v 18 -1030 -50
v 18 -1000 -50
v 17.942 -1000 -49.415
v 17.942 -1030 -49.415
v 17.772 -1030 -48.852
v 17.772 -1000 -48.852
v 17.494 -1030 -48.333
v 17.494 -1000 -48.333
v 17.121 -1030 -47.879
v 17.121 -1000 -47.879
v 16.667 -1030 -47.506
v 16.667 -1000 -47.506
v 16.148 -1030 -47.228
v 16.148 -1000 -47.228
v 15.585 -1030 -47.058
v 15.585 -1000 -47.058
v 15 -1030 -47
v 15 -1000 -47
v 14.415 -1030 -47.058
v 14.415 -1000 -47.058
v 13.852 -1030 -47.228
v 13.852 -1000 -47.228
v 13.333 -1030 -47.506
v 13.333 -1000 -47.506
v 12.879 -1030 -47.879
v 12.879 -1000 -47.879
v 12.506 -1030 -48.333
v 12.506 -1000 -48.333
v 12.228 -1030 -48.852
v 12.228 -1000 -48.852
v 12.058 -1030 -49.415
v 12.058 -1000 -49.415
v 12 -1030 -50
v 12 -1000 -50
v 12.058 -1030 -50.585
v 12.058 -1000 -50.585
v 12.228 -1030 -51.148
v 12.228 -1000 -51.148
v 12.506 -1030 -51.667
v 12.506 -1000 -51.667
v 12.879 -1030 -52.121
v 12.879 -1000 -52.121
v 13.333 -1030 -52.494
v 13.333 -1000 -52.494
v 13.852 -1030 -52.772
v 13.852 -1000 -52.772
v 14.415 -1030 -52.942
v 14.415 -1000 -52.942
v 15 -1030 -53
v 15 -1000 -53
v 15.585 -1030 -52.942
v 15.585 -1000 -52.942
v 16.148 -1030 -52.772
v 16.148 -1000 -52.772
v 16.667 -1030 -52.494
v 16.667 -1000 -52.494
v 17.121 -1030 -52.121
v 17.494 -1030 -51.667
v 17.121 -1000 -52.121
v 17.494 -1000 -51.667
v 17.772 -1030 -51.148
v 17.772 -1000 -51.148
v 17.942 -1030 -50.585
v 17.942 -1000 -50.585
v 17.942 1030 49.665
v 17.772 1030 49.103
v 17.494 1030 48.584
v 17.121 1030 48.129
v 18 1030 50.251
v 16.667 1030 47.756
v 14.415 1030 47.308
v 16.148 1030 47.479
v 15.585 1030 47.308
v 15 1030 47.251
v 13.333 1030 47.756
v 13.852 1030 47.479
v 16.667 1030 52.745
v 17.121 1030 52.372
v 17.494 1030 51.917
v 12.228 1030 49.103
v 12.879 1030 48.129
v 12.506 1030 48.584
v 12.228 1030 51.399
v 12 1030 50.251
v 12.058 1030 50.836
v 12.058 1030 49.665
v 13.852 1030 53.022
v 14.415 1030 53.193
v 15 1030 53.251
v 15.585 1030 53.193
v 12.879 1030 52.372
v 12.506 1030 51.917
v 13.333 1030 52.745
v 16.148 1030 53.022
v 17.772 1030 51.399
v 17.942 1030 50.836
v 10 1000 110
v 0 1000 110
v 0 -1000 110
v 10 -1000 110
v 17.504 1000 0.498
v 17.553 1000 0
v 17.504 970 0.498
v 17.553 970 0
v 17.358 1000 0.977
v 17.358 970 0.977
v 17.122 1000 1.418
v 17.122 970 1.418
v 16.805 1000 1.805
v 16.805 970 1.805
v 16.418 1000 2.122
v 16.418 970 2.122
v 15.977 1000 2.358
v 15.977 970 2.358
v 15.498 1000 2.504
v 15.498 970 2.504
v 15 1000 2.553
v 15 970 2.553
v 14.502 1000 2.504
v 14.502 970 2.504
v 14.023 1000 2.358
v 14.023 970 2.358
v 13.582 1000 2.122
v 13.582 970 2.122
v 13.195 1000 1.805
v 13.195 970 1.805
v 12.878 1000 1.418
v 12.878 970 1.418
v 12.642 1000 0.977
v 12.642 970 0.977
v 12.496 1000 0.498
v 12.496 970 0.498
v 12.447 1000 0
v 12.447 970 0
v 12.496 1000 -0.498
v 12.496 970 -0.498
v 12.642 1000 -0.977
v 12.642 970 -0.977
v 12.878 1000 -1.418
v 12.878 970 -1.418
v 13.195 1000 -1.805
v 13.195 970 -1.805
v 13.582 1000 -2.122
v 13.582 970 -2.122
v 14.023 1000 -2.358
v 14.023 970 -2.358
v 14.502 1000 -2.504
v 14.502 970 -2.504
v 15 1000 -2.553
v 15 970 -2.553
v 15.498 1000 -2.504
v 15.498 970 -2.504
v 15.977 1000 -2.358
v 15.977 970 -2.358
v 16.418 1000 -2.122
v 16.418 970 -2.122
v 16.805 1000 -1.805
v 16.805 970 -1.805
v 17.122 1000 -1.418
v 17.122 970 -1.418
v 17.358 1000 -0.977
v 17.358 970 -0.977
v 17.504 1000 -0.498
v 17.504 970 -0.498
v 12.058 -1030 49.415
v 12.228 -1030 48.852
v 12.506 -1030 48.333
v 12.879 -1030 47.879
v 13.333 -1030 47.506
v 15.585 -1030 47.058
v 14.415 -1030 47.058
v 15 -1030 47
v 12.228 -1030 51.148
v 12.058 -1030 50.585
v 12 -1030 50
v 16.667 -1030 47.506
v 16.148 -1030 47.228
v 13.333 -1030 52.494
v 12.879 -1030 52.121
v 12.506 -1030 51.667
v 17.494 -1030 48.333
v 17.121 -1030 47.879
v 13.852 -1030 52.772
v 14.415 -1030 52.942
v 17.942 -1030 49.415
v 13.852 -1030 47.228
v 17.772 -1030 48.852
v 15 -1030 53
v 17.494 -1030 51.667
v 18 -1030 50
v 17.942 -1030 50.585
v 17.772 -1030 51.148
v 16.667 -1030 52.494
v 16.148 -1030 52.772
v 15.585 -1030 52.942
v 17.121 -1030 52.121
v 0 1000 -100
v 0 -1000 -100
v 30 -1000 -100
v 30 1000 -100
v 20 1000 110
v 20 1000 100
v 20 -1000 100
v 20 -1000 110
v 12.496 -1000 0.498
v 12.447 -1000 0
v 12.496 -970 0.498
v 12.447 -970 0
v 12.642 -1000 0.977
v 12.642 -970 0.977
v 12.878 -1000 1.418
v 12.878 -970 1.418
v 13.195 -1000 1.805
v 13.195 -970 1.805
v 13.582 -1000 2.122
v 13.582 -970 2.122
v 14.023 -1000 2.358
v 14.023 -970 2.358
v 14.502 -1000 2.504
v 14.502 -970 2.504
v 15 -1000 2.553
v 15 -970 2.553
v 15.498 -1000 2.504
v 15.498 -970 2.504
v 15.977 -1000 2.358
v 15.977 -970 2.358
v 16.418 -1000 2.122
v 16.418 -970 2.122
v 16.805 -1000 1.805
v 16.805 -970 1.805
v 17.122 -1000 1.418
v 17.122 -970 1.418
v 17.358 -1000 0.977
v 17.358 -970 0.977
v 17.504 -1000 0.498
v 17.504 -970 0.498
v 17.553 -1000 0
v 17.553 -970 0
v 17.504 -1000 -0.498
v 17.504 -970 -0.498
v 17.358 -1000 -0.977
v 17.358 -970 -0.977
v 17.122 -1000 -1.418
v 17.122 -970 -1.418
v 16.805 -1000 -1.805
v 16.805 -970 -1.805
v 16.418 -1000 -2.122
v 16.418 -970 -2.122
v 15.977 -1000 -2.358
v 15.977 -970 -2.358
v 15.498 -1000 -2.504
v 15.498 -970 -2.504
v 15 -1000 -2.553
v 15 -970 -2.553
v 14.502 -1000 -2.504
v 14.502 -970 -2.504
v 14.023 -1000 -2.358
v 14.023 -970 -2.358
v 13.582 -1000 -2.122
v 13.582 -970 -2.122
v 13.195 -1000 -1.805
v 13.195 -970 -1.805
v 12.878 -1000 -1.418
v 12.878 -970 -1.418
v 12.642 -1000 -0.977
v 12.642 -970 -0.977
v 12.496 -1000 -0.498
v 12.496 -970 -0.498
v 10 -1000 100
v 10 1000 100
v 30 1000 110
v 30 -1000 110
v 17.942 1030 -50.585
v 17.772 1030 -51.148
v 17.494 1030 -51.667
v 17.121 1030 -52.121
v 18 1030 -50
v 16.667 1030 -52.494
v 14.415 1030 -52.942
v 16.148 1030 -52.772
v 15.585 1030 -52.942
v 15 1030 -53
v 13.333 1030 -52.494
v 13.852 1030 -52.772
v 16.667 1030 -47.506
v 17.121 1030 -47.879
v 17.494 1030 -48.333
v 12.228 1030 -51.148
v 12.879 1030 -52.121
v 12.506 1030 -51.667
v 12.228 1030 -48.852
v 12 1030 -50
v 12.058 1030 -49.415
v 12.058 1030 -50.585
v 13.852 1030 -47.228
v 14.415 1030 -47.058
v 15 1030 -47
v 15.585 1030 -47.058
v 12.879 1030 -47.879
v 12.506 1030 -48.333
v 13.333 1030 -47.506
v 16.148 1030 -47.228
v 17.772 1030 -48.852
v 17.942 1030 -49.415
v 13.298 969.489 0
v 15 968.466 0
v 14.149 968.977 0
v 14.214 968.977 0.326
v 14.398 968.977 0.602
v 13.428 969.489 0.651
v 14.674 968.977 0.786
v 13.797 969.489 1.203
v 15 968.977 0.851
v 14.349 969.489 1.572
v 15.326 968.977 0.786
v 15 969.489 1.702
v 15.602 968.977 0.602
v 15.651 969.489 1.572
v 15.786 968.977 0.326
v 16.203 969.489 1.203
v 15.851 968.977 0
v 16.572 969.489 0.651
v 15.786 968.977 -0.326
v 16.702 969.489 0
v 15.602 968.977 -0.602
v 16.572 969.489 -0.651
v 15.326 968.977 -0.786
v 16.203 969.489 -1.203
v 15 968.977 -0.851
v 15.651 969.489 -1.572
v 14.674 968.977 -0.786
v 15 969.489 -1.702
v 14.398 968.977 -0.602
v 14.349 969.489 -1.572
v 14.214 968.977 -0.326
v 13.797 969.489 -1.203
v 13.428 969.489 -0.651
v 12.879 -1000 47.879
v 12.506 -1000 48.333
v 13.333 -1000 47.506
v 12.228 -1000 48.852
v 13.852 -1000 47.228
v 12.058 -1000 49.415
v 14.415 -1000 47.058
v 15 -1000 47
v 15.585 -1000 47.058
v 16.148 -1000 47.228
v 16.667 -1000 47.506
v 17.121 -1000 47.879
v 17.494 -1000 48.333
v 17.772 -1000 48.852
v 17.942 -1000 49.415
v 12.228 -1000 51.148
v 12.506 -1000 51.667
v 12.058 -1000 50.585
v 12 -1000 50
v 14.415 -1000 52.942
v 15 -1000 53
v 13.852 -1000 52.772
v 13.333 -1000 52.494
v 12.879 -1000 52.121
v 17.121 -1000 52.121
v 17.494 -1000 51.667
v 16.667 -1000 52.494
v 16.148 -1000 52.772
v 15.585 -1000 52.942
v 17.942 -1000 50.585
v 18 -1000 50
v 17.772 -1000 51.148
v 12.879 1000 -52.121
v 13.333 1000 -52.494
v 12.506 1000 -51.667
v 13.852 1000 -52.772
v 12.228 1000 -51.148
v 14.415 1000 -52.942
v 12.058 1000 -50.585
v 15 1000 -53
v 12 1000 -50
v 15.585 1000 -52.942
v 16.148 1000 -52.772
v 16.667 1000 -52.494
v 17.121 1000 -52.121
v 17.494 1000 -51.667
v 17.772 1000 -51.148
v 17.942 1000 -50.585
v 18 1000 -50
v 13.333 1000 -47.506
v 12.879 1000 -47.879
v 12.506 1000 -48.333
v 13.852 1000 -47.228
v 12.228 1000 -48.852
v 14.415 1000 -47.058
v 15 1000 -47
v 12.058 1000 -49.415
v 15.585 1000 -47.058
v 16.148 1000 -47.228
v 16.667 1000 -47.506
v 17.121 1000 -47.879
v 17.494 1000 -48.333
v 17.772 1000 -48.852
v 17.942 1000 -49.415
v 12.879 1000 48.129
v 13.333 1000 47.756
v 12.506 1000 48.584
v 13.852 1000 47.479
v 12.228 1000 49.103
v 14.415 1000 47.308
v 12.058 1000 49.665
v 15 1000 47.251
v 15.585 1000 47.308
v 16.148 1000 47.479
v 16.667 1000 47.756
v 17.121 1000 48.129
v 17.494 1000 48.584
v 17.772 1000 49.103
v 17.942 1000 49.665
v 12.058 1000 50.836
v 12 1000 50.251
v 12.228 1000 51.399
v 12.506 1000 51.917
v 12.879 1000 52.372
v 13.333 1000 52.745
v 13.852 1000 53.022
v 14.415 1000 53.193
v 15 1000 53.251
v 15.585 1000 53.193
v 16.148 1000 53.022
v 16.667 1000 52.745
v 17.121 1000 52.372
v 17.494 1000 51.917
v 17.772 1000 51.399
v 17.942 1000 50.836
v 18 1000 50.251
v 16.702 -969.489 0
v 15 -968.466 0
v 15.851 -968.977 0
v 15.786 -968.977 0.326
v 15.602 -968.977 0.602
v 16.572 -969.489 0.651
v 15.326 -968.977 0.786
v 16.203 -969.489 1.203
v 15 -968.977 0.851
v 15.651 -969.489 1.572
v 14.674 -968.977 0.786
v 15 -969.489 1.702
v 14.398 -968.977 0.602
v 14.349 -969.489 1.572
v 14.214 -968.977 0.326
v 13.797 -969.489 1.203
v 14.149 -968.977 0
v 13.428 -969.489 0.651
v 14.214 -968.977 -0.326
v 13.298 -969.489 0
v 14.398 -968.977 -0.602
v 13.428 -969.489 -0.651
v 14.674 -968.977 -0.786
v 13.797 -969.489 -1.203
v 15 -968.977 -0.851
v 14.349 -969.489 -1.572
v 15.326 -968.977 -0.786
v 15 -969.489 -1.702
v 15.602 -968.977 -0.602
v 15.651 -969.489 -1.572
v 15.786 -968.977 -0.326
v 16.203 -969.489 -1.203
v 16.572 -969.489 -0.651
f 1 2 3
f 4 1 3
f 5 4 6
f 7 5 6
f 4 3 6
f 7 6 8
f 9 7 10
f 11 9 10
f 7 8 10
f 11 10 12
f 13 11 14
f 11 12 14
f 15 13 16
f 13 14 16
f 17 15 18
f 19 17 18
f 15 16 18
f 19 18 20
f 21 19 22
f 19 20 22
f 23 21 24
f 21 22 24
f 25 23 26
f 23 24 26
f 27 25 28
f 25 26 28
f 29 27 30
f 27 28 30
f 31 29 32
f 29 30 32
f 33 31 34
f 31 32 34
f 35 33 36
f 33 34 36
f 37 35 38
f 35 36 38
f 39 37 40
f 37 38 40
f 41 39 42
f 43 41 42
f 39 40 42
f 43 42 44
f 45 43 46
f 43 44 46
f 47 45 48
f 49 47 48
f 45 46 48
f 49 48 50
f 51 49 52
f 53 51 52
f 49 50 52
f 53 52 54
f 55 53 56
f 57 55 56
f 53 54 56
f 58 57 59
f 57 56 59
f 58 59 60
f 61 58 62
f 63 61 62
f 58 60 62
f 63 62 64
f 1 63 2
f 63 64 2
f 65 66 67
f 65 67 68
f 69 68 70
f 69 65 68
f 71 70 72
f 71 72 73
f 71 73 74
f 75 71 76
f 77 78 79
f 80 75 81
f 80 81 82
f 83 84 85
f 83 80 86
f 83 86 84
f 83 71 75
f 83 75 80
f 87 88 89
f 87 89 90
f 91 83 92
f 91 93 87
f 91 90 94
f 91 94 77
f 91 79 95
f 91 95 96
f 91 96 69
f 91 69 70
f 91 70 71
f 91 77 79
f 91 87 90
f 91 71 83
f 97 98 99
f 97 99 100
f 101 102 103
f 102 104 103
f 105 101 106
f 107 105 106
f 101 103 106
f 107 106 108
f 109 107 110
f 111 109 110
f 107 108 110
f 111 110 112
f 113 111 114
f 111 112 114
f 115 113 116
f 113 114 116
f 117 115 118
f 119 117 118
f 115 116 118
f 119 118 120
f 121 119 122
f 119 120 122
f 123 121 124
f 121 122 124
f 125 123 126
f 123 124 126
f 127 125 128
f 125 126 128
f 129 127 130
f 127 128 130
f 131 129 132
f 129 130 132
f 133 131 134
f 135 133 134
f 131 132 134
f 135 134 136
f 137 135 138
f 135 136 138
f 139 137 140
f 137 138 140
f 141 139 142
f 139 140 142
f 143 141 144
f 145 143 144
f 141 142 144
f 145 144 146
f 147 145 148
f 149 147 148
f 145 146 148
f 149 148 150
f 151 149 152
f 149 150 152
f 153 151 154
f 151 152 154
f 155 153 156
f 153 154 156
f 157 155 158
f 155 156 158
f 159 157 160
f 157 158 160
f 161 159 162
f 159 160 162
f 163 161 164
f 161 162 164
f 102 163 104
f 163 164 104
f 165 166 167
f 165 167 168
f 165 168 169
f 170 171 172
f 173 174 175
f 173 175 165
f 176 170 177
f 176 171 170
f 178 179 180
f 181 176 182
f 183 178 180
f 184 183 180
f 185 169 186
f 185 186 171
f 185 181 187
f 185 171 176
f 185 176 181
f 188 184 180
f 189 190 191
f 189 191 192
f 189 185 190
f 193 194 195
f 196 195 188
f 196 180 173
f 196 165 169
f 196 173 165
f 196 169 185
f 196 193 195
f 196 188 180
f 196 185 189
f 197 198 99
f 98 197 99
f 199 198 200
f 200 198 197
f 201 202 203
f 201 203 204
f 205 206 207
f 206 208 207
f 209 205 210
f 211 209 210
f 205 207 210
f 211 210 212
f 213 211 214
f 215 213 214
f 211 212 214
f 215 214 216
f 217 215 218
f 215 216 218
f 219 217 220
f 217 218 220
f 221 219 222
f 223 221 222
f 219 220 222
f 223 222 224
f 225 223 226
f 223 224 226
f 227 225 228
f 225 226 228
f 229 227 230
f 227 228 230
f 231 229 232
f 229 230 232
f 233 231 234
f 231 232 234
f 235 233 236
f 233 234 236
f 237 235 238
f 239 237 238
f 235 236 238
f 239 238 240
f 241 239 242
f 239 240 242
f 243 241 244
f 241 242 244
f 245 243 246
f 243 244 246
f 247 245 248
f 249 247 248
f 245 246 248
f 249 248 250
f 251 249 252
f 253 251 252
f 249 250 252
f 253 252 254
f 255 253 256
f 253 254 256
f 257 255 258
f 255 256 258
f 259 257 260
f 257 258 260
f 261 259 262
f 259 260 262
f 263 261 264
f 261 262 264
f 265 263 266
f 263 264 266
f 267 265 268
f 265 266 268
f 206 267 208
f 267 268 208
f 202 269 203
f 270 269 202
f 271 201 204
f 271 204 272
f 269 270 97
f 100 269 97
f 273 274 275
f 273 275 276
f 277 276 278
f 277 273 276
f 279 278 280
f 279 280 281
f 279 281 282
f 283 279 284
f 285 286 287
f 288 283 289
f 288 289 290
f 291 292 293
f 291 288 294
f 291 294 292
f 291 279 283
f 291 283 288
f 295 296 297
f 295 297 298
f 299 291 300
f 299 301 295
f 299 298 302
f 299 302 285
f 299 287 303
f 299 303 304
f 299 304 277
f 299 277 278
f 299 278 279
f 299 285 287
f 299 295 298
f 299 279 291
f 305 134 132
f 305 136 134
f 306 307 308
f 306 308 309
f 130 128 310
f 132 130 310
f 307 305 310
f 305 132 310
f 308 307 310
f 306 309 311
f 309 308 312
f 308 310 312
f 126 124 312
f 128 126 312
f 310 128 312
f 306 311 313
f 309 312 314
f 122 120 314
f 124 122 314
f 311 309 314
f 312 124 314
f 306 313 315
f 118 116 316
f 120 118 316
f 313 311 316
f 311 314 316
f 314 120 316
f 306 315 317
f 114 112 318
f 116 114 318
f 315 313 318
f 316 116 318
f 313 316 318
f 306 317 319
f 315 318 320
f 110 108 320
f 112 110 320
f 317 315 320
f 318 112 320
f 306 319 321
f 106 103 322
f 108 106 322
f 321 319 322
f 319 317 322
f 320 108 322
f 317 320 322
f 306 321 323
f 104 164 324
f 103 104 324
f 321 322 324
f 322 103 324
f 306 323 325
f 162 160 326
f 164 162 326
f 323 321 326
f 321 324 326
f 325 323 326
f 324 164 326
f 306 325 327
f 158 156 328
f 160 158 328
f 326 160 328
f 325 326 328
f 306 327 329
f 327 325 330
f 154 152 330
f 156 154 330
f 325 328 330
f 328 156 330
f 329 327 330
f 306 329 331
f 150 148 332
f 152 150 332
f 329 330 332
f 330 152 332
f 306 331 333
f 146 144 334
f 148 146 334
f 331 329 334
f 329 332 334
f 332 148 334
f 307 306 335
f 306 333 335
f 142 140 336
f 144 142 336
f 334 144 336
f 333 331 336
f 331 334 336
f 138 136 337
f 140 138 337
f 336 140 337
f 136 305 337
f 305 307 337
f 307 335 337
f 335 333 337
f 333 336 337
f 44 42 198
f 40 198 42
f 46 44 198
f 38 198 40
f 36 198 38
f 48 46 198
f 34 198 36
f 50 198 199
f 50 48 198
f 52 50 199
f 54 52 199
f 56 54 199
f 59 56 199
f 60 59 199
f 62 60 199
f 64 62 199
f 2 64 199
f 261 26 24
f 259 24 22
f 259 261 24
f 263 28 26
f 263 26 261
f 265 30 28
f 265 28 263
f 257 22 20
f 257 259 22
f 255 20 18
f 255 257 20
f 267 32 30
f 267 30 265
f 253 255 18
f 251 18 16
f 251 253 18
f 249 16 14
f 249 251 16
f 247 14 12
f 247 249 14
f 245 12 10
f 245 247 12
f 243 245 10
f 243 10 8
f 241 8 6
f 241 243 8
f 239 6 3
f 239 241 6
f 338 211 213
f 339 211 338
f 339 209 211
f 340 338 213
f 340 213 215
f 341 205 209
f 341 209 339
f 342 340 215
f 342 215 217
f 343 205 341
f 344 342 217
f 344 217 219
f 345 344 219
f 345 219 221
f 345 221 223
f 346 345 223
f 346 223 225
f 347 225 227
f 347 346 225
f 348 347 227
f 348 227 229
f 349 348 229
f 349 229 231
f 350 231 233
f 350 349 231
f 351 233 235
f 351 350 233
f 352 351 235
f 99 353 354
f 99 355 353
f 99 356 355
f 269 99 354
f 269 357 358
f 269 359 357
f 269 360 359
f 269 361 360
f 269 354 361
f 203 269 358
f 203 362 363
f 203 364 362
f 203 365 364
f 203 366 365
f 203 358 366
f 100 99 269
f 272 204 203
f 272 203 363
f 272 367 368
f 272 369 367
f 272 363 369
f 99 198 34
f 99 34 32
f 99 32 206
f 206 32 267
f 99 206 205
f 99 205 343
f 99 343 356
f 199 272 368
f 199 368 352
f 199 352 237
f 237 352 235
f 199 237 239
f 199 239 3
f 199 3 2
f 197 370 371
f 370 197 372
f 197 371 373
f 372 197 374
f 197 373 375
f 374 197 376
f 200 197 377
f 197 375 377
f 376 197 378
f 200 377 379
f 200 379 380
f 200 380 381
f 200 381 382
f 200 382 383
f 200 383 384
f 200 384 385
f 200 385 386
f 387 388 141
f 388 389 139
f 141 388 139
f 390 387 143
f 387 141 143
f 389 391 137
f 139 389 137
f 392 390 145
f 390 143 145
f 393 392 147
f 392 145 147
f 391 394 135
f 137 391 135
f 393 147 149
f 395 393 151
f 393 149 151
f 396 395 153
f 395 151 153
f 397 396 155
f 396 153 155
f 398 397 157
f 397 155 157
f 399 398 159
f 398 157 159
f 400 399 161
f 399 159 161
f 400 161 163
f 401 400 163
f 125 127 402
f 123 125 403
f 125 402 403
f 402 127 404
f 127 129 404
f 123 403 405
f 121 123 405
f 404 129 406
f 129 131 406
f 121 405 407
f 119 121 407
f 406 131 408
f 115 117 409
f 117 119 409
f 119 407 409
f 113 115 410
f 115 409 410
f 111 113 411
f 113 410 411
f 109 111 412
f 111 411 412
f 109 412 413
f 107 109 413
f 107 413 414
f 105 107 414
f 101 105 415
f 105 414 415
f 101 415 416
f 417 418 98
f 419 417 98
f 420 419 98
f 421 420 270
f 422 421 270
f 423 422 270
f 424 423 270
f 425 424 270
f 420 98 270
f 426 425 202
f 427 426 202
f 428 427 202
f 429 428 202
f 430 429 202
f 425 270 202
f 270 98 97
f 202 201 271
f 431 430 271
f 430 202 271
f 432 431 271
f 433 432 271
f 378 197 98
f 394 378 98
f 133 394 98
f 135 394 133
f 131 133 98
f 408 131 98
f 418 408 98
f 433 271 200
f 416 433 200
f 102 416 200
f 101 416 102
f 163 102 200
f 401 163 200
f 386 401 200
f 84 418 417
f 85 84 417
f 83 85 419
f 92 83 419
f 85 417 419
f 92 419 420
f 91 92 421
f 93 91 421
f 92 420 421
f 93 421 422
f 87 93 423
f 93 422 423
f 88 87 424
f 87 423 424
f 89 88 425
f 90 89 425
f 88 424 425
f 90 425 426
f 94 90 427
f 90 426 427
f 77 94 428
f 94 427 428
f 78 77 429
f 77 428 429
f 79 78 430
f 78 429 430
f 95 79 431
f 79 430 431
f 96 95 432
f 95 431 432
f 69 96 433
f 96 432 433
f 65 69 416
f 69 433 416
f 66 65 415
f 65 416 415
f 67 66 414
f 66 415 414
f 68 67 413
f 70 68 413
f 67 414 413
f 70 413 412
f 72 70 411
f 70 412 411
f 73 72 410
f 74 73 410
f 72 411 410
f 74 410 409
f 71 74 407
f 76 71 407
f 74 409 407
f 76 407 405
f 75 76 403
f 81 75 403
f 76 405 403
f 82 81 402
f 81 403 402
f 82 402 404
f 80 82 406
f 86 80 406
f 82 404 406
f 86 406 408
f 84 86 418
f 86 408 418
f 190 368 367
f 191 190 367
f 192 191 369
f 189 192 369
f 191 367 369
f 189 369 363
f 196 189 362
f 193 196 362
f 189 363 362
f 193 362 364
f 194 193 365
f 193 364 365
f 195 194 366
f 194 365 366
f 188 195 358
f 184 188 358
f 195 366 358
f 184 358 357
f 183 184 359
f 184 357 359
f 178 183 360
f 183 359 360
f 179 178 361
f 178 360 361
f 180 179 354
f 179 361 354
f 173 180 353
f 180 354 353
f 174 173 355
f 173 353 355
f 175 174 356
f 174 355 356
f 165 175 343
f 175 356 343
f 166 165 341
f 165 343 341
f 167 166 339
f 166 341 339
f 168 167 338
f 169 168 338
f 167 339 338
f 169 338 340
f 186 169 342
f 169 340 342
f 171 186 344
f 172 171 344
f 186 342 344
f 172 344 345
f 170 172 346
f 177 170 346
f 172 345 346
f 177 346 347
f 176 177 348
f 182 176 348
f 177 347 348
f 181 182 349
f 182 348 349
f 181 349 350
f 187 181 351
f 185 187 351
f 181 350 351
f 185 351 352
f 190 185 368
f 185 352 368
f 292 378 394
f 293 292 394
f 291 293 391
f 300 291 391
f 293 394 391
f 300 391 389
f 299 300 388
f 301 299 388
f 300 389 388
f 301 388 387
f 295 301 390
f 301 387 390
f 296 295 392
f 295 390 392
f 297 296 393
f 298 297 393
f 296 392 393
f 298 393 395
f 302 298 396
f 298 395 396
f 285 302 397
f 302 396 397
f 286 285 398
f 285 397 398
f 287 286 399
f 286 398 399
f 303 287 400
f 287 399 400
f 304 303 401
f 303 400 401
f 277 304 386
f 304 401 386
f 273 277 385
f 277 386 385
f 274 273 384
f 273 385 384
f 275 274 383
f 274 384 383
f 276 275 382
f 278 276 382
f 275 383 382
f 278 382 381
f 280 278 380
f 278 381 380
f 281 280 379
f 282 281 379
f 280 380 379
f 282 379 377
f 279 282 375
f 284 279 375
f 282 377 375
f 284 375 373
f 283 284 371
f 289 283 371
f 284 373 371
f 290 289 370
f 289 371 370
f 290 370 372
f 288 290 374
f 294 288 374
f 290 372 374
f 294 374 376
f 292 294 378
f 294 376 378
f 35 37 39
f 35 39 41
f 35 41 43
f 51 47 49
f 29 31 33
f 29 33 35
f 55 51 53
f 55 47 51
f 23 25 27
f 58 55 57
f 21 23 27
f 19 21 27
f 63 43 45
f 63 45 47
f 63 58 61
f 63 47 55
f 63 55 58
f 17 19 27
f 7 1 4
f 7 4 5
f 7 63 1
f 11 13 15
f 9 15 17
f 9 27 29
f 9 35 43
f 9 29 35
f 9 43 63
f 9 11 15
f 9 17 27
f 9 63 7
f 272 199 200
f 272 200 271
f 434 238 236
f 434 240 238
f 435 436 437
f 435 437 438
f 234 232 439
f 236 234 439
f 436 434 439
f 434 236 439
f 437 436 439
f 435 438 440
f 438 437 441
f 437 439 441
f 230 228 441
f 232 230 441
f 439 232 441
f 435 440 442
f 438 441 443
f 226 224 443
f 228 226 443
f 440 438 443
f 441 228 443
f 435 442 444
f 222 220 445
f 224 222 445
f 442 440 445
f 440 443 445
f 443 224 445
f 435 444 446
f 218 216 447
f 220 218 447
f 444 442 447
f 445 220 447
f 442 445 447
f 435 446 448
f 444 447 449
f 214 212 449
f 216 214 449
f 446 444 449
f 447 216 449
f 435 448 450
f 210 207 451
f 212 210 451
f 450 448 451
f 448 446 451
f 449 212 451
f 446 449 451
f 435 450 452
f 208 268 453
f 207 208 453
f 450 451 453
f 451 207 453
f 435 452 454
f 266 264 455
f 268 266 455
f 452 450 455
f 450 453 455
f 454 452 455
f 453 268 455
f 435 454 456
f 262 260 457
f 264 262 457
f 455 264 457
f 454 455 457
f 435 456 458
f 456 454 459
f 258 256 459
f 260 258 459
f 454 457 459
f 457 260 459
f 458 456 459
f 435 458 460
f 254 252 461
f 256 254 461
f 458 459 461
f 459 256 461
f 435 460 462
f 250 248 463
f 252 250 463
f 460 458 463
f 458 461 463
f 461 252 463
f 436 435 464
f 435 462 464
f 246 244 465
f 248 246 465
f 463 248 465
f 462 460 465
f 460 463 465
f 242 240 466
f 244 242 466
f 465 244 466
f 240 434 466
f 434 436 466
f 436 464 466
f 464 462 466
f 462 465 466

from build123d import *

# Parameters (mm, degrees)
F0_W      = 2000
F0_H      = 200
F1_DEPTH  = 30
F2_W      = 10
F2_H      = 10
F3_DEPTH  = 2000
F5_R      = 3
F6_DEPTH  = 30
F7_R      = 3
F8_DEPTH  = 30
F4_W      = 10
F4_H      = 10
F9_DEPTH  = 2000
F11_D     = 5.1054
F11_DEPTH = 30
F11_TIP   = 1.5338169022
F13_D     = 5.1054
F13_DEPTH = 30
F13_TIP   = 1.5338169022


with BuildPart() as f1:
    # F0 (on Right) → F1 (new body)
    with BuildSketch(Plane.YZ):
        Rectangle(F0_W, F0_H)
    extrude(amount=F1_DEPTH)

    # F2 (on face) → F3 (join)
    with BuildSketch(Plane.XZ.offset(1000)):
        with Locations((5, 105)):
            Rectangle(F2_W, F2_H)
    extrude(amount=-F3_DEPTH)

    # F5 (on face) → F6 (join)
    with BuildSketch(Plane(origin=(0, 1000, 0), x_dir=(-1, 0, 0), z_dir=(0, 1, 0))):
        with Locations((-15, -50)):
            Circle(F5_R)
        with Locations((-15, 50.2506281447)):
            Circle(F5_R)
    extrude(amount=F6_DEPTH)

    # F7 (on face) → F8 (join)
    with BuildSketch(Plane.XZ.offset(1000)):
        with Locations((15, 50)):
            Circle(F7_R)
        with Locations((15, -50)):
            Circle(F7_R)
    extrude(amount=F8_DEPTH)

    # F4 (on face) → F9 (join)
    with BuildSketch(Plane.XZ.offset(1000)):
        with Locations((25, 105)):
            Rectangle(F4_W, F4_H)
    extrude(amount=-F9_DEPTH)

    # F11
    with Locations(Plane.XZ.offset(1000)):
        with Locations((15, 0)):
            Hole(F11_D / 2, depth=F11_DEPTH)
            with Locations((0, 0, -(F11_DEPTH + F11_TIP / 2))):  # 118° drill point
                Cone(0, F11_D / 2, F11_TIP, mode=Mode.SUBTRACT)

    # F13
    with Locations(Plane(origin=(0, 1000, 0), x_dir=(-1, 0, 0), z_dir=(0, 1, 0))):
        with Locations((-15, 0)):
            Hole(F13_D / 2, depth=F13_DEPTH)
            with Locations((0, 0, -(F13_DEPTH + F13_TIP / 2))):  # 118° drill point
                Cone(0, F13_D / 2, F13_TIP, mode=Mode.SUBTRACT)


solid = f1.part
